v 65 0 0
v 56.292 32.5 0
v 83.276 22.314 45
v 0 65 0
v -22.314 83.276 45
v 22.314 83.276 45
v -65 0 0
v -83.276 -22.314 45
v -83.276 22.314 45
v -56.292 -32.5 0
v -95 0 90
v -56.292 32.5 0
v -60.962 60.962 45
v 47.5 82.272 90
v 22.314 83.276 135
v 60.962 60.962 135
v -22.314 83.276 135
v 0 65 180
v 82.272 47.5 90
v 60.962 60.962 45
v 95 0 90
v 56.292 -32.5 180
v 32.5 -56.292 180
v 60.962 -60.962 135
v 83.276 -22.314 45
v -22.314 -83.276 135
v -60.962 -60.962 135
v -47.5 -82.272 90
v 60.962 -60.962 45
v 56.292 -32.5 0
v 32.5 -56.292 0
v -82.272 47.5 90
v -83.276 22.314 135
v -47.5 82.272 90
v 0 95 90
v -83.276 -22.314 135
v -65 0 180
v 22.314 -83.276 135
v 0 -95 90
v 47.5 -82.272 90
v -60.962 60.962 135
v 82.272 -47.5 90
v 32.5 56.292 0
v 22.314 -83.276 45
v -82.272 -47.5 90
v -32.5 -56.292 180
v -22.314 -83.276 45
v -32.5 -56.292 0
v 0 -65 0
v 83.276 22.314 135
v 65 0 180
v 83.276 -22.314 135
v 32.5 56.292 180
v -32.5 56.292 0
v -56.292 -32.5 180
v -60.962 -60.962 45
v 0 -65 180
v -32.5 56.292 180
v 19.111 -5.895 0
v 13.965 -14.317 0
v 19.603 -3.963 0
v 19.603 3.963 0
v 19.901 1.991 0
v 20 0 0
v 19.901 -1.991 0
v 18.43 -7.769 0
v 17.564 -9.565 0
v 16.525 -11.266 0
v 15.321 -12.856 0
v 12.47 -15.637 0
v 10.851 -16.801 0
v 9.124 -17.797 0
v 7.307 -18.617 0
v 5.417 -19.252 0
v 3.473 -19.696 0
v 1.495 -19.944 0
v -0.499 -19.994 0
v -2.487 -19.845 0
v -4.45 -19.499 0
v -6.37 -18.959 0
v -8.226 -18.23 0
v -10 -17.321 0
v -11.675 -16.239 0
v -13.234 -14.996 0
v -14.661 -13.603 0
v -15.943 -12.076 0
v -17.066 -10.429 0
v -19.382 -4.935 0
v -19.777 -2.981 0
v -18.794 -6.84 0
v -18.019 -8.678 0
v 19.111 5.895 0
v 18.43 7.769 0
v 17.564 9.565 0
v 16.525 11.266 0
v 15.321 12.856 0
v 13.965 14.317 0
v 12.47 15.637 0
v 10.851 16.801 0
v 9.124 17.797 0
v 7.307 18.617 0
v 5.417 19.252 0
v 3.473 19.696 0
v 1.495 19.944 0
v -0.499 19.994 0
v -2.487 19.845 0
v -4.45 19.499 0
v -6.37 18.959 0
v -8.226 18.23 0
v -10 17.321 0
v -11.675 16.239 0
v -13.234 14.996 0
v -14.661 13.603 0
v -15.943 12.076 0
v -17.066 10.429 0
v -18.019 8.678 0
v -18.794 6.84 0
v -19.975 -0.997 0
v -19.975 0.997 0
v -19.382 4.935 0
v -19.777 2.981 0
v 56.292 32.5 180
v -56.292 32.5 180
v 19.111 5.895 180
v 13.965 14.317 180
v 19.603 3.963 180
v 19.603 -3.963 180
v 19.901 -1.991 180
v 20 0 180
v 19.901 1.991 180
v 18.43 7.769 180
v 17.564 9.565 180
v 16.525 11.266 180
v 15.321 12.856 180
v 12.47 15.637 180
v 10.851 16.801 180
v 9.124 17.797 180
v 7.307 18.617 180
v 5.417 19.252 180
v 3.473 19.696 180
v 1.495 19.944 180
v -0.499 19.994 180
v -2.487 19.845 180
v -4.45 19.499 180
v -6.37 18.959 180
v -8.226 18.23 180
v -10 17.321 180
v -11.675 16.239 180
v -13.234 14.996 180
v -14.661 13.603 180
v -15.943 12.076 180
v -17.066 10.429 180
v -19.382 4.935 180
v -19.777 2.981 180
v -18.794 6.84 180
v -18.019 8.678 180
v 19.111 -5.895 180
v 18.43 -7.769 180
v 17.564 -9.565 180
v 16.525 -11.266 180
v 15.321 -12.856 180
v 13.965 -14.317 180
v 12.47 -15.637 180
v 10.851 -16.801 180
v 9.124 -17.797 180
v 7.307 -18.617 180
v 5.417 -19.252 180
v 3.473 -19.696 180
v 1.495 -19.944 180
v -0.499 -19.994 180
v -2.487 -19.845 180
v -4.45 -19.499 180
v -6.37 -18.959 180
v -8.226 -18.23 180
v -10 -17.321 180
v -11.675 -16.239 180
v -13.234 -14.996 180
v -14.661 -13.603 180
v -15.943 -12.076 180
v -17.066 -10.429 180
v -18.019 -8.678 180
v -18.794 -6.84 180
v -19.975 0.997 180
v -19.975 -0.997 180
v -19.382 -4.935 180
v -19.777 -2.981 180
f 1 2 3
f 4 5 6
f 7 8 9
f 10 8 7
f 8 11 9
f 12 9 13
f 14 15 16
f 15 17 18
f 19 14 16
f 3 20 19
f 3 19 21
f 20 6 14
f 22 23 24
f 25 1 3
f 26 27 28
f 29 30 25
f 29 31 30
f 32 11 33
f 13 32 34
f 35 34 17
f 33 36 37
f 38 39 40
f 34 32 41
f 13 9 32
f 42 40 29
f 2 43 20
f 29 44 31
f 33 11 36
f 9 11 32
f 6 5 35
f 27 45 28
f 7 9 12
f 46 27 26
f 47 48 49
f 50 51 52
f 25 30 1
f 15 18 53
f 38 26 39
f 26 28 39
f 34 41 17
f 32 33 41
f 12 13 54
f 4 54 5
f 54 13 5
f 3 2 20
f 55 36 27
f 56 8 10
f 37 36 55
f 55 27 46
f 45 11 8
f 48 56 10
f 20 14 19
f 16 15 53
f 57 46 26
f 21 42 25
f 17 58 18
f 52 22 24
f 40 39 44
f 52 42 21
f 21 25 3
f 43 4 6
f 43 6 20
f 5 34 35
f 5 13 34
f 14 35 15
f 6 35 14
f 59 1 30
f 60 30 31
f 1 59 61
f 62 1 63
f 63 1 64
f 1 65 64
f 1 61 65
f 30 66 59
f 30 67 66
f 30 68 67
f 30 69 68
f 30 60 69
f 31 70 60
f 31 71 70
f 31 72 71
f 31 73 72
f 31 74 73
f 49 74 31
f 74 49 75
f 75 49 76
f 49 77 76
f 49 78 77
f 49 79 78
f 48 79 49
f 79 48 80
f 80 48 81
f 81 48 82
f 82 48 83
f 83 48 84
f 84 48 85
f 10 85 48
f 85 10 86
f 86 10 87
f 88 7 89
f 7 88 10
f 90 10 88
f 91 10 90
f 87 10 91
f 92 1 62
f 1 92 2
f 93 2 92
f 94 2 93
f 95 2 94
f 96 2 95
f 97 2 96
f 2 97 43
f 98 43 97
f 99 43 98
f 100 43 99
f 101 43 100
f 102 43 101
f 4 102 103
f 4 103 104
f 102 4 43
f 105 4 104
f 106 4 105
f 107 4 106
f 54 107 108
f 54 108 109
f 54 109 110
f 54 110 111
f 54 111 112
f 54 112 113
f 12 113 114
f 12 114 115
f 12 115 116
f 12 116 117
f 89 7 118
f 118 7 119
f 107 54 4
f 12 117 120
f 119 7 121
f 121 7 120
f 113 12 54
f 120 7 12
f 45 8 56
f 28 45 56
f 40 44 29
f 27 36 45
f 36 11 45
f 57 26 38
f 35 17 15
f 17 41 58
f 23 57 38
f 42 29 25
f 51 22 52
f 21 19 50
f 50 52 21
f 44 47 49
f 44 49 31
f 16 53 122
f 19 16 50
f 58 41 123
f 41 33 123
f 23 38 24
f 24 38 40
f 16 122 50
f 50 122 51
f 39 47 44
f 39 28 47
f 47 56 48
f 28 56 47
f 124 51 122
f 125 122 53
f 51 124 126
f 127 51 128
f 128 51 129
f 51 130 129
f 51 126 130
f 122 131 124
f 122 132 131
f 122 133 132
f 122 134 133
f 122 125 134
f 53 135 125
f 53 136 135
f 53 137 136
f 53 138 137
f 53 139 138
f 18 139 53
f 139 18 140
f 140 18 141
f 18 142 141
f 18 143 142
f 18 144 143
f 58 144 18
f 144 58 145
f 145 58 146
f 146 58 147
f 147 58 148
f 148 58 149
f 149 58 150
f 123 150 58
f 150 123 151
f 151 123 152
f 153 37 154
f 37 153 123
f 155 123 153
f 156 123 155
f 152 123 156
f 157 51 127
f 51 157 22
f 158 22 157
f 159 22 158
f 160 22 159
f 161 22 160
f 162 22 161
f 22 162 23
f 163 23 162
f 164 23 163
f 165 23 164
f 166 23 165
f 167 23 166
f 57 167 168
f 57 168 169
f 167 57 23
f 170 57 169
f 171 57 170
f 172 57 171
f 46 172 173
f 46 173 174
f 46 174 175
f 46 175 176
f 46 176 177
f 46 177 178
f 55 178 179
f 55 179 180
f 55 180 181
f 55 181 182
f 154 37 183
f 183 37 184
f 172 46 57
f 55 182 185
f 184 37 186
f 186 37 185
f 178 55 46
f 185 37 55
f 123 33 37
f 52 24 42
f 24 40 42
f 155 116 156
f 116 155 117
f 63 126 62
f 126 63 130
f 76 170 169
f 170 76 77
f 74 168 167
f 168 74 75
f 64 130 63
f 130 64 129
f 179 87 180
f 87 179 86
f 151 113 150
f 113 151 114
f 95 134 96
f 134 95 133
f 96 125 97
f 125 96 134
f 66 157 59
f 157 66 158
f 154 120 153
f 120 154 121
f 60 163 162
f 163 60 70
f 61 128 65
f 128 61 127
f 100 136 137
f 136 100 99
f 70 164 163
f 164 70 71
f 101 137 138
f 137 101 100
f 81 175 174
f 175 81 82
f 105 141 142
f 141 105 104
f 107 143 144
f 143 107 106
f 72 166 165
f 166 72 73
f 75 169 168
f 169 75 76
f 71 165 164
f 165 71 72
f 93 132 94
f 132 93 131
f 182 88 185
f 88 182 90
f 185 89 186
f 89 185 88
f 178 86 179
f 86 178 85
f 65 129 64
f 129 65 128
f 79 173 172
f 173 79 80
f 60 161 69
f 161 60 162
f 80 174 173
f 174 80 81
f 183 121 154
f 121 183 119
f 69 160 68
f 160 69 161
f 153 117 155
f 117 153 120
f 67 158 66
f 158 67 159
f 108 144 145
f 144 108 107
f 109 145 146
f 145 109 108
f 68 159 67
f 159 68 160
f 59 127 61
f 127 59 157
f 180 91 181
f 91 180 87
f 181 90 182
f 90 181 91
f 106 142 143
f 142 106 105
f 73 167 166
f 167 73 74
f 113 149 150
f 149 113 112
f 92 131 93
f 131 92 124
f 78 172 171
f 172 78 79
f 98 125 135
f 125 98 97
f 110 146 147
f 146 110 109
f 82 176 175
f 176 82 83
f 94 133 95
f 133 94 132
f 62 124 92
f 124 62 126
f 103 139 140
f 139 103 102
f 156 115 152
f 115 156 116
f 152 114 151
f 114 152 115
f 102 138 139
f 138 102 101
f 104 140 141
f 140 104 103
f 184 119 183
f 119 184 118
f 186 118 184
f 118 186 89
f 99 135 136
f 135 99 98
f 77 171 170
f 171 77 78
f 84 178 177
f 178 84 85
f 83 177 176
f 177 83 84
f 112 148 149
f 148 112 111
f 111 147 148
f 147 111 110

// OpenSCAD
CylinderPoints = [[65.0, 0.0, 0.0], [56.2917, 32.5, 0.0], [32.5, 56.2917, 0.0], [0.0, 65.0, 0.0], [-32.5, 56.2917, 0.0], [-56.2917, 32.5, 0.0], [-65.0, 0.0, 0.0], [-56.2917, -32.5, 0.0], [-32.5, -56.2917, 0.0], [-0.0, -65.0, 0.0], [32.5, -56.2917, 0.0], [56.2917, -32.5, 0.0], [83.2756, 22.3136, 45.0], [60.9619, 60.9619, 45.0], [22.3136, 83.2756, 45.0], [-22.3136, 83.2756, 45.0], [-60.9619, 60.9619, 45.0], [-83.2756, 22.3136, 45.0], [-83.2756, -22.3136, 45.0], [-60.9619, -60.9619, 45.0], [-22.3136, -83.2756, 45.0], [22.3136, -83.2756, 45.0], [60.9619, -60.9619, 45.0], [83.2756, -22.3136, 45.0], [95.0, 0.0, 90.0], [82.2724, 47.5, 90.0], [47.5, 82.2724, 90.0], [0.0, 95.0, 90.0], [-47.5, 82.2724, 90.0], [-82.2724, 47.5, 90.0], [-95.0, 0.0, 90.0], [-82.2724, -47.5, 90.0], [-47.5, -82.2724, 90.0], [-0.0, -95.0, 90.0], [47.5, -82.2724, 90.0], [82.2724, -47.5, 90.0], [83.2756, 22.3136, 135.0], [60.9619, 60.9619, 135.0], [22.3136, 83.2756, 135.0], [-22.3136, 83.2756, 135.0], [-60.9619, 60.9619, 135.0], [-83.2756, 22.3136, 135.0], [-83.2756, -22.3136, 135.0], [-60.9619, -60.9619, 135.0], [-22.3136, -83.2756, 135.0], [22.3136, -83.2756, 135.0], [60.9619, -60.9619, 135.0], [83.2756, -22.3136, 135.0], [65.0, 0.0, 180.0], [56.2917, 32.5, 180.0], [32.5, 56.2917, 180.0], [0.0, 65.0, 180.0], [-32.5, 56.2917, 180.0], [-56.2917, 32.5, 180.0], [-65.0, 0.0, 180.0], [-56.2917, -32.5, 180.0], [-32.5, -56.2917, 180.0], [-0.0, -65.0, 180.0], [32.5, -56.2917, 180.0], [56.2917, -32.5, 180.0], [0, 0, 0], [0, 0, 180]] ;
CylinderFaces = [[0, 12, 1], [1, 12, 13], [1, 13, 2], [2, 13, 14], [2, 14, 3], [3, 14, 15], [3, 15, 4], [4, 15, 16], [4, 16, 5], [5, 16, 17], [5, 17, 6], [6, 17, 18], [6, 18, 7], [7, 18, 19], [7, 19, 8], [8, 19, 20], [8, 20, 9], [9, 20, 21], [9, 21, 10], [10, 21, 22], [10, 22, 11], [11, 22, 23], [11, 23, 0], [12, 0, 23], [23, 24, 12], [12, 24, 25], [12, 25, 13], [13, 25, 26], [13, 26, 14], [14, 26, 27], [14, 27, 15], [15, 27, 28], [15, 28, 16], [16, 28, 29], [16, 29, 17], [17, 29, 30], [17, 30, 18], [18, 30, 31], [18, 31, 19], [19, 31, 32], [19, 32, 20], [20, 32, 33], [20, 33, 21], [21, 33, 34], [21, 34, 22], [22, 34, 35], [22, 35, 23], [23, 35, 24], [24, 36, 25], [25, 36, 37], [25, 37, 26], [26, 37, 38], [26, 38, 27], [27, 38, 39], [27, 39, 28], [28, 39, 40], [28, 40, 29], [29, 40, 41], [29, 41, 30], [30, 41, 42], [30, 42, 31], [31, 42, 43], [31, 43, 32], [32, 43, 44], [32, 44, 33], [33, 44, 45], [33, 45, 34], [34, 45, 46], [34, 46, 35], [35, 46, 47], [35, 47, 24], [36, 24, 47], [47, 48, 36], [36, 48, 49], [36, 49, 37], [37, 49, 50], [37, 50, 38], [38, 50, 51], [38, 51, 39], [39, 51, 52], [39, 52, 40], [40, 52, 53], [40, 53, 41], [41, 53, 54], [41, 54, 42], [42, 54, 55], [42, 55, 43], [43, 55, 56], [43, 56, 44], [44, 56, 57], [44, 57, 45], [45, 57, 58], [45, 58, 46], [46, 58, 59], [46, 59, 47], [47, 59, 48], [0, 1, 60], [49.0, 48.0, 61], [1, 2, 60], [50.0, 49.0, 61], [2, 3, 60], [51.0, 50.0, 61], [3, 4, 60], [52.0, 51.0, 61], [4, 5, 60], [53.0, 52.0, 61], [5, 6, 60], [54.0, 53.0, 61], [6, 7, 60], [55.0, 54.0, 61], [7, 8, 60], [56.0, 55.0, 61], [8, 9, 60], [57.0, 56.0, 61], [9, 10, 60], [58.0, 57.0, 61], [10, 11, 60], [59.0, 58.0, 61], [11, 0, 60], [48.0, 59.0, 61]] ;
difference() {
    polyhedron( CylinderPoints, CylinderFaces, convexity = 10);
    translate([0,0,-10]) linear_extrude(200) circle(d=40, $fa=1);
}
